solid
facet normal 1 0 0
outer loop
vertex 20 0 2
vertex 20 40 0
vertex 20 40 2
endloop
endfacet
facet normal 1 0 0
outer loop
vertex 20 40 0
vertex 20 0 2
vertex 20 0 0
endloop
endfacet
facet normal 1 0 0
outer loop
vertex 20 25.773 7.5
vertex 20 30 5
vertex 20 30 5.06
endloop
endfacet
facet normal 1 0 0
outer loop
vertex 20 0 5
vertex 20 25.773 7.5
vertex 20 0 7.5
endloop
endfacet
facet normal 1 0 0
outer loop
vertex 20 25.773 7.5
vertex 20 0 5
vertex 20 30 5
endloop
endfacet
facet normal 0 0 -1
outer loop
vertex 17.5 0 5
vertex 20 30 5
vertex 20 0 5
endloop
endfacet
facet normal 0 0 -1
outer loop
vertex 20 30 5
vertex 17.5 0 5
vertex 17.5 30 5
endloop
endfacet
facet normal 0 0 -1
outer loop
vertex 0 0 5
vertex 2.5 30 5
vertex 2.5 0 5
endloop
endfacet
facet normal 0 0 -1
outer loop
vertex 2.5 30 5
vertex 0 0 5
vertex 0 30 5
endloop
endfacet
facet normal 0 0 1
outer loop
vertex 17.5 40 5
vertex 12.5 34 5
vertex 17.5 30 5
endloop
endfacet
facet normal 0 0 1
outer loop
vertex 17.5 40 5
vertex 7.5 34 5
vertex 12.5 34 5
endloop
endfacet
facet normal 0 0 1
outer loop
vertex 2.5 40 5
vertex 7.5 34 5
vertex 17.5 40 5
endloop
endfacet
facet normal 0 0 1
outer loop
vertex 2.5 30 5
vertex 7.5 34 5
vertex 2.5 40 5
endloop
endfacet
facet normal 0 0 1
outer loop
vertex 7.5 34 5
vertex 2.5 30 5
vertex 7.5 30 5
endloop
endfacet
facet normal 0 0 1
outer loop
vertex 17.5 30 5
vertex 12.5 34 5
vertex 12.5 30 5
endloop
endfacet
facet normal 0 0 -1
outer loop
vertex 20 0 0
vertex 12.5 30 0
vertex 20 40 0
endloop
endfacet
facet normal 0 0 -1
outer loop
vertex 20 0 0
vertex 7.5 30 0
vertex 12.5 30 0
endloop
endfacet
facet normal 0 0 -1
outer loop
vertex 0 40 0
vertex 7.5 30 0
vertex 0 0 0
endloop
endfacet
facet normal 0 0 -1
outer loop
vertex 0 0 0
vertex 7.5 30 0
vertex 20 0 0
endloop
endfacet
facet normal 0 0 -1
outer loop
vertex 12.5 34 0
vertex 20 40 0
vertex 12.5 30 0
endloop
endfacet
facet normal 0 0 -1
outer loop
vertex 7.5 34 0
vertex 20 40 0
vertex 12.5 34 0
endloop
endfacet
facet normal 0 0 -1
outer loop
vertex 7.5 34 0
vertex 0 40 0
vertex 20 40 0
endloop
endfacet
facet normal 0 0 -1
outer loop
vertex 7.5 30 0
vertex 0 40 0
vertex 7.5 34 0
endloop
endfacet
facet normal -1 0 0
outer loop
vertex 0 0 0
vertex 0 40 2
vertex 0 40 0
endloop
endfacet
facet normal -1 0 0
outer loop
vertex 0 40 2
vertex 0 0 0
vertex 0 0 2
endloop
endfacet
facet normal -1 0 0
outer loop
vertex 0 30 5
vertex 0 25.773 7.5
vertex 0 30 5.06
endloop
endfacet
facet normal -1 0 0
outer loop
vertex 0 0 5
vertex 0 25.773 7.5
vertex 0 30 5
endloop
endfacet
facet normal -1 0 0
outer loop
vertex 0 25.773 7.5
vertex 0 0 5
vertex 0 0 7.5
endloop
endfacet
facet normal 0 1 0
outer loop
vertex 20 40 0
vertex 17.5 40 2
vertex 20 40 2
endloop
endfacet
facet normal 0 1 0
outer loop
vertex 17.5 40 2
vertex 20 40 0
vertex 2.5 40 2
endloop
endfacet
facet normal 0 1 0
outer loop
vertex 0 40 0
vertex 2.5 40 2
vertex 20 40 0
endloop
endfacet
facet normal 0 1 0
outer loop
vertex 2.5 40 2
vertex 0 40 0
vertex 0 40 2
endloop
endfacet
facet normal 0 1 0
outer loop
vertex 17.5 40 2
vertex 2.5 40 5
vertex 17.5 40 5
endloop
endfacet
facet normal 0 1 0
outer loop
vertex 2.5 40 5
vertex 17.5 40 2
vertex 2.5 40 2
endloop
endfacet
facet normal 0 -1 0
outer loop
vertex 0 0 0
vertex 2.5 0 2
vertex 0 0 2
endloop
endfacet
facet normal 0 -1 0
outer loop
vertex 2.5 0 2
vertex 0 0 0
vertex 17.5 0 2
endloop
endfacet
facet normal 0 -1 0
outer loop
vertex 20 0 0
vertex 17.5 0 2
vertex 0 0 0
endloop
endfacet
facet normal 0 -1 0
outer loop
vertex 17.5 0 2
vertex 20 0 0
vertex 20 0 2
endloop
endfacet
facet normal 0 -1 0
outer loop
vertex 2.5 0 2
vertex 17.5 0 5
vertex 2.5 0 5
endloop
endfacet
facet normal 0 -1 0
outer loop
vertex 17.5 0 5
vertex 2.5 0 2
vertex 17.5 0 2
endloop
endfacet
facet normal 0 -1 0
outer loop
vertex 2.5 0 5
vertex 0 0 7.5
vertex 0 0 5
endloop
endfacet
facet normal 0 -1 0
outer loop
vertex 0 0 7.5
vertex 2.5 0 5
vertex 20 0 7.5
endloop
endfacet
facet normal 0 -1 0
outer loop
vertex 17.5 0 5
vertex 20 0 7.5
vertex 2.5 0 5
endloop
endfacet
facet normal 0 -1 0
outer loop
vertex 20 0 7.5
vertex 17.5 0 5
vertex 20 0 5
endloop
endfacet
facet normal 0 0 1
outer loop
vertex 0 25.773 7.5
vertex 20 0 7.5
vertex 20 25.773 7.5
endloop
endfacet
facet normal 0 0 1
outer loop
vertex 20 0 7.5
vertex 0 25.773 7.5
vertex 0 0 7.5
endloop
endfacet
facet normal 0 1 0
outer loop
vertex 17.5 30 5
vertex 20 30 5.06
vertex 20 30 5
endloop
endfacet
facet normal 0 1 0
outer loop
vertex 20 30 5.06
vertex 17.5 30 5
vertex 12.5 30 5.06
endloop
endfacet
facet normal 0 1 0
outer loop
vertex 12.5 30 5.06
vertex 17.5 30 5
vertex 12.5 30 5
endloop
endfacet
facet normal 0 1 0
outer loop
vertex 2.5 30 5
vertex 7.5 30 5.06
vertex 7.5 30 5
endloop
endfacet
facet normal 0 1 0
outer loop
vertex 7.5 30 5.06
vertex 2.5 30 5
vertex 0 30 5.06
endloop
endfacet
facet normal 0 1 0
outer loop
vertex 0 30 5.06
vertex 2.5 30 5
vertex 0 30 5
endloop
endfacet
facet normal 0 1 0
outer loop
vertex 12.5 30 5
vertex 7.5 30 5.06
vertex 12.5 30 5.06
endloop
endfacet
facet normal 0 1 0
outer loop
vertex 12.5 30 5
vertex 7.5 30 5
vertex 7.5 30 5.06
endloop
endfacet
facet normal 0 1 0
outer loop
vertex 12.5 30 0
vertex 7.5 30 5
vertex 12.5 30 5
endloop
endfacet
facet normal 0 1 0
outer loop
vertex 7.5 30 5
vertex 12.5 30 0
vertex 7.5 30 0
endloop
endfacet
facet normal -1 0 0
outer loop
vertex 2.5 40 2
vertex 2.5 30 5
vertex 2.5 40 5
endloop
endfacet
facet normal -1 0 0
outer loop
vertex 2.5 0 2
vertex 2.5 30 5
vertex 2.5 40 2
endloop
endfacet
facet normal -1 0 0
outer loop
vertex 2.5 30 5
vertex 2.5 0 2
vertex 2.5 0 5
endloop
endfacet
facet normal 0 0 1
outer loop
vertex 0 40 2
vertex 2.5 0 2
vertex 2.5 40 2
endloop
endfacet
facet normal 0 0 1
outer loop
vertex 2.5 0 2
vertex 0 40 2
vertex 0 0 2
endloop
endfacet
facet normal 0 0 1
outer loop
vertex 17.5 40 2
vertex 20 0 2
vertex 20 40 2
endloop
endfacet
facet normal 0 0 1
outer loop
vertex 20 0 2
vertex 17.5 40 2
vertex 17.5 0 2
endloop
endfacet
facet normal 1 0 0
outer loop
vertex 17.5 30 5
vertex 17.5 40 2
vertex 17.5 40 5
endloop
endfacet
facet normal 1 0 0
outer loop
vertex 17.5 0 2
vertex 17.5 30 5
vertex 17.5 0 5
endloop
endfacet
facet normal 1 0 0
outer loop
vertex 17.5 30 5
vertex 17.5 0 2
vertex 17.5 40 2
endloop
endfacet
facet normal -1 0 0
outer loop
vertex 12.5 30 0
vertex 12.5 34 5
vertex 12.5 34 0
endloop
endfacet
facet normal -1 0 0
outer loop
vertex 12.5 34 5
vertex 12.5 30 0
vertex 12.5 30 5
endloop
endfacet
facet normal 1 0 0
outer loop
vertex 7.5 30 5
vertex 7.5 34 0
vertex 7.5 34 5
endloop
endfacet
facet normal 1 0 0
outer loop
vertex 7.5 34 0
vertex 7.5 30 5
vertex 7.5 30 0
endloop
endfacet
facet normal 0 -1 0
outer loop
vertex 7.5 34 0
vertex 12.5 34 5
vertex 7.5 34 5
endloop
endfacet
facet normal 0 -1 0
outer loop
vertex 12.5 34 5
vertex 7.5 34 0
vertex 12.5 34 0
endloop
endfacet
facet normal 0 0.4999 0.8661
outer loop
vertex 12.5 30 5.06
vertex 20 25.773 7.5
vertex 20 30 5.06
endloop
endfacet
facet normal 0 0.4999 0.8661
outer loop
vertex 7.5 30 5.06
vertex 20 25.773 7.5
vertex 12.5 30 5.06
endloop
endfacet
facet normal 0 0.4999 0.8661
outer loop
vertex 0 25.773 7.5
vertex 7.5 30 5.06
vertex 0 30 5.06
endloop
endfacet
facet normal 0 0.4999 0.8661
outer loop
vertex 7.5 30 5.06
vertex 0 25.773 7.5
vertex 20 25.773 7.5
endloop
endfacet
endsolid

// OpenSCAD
/*
* Object: Bicycle headlight mount
* Creator: Patrick Ma
* Date started: 5/33/2014
* Date completed: 
* This is only the lower half of the bracket
*/


// global variables

baseW = 20; // x-axis
baseL = 40; // y-axis
baseH = 5; // z-axis
baseTang = 15; // W of center ridge
lipH = 2; 
totalH = 1.5*baseH;// The total height of the base bracket

// locking hole
lockW = 5;	
lockL = 4;


/*
 * creates the section of the bracket that insets into the mounting bracket on
 * the bike.
 */
module mountBase() {
	slotW = (baseW - baseTang) /2;	// calculate the depth of the retaining slot
	difference(){

		// add these
		union() {
			cube([baseW, baseL, baseH]); // bottom
			translate([0,0,baseH]) 
				cube([baseW, 0.75*baseL, baseH/2]); // top
		}

		// subtract these
		union() {
			// create the slots
			for (i = [0,1]) {
#translate([(0.1)*(i-1) + i*(baseTang + slotW), -0.25, 2]) 
				cube([ slotW+0.1, baseL + 0.5, baseH - lipH]);
			}

			// create the locking hole
# translate([(baseW - lockW)/2, 30, -0.1])
			cube([lockW, lockL, totalH + 0.2]); 

			// bevel front of top
#translate([baseW/2, 0.75*baseL-1.4, 1.5*baseH+0.1]) 
			rotate([0, 90, 0]) rotate(60)
				cube([5, 3, baseW+0.1], center=true);

		}
	}
}

mountBase();
//translate([baseW /2, 7, totalH]) lowerBracket(25);
